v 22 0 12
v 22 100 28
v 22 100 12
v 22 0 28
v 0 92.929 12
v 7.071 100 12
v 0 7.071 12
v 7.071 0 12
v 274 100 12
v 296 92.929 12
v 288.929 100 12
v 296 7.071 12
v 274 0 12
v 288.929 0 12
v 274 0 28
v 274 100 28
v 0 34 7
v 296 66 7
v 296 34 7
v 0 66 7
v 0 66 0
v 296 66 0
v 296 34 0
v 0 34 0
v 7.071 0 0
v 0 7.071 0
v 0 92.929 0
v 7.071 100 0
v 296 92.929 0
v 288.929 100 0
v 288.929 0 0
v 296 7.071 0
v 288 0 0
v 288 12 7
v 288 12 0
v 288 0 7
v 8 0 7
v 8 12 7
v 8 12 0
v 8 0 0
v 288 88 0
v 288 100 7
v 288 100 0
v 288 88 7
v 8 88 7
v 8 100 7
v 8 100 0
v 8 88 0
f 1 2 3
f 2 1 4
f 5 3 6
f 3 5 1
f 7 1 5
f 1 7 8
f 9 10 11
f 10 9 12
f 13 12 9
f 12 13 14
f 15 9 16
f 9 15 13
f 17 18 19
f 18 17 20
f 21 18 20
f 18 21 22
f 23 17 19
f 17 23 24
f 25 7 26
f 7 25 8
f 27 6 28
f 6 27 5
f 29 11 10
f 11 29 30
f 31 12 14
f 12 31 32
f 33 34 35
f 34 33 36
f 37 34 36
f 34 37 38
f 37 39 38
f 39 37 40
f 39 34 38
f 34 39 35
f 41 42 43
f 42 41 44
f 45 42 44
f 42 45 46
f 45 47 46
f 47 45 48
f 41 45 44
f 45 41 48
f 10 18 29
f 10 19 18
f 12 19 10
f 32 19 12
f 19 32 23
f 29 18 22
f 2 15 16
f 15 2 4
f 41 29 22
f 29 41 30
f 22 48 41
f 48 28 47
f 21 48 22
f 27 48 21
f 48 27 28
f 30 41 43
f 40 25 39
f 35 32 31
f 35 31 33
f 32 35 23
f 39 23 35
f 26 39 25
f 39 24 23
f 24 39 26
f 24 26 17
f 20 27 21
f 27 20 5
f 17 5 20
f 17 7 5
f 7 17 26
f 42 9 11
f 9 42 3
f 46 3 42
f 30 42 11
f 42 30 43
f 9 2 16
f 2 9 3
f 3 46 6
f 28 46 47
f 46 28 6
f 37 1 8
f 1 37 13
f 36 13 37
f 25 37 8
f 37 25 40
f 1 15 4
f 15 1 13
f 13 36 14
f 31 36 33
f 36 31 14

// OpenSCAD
include <../src/wardrobe.scad>;
plank_yx_middle_top();
//github_openscad -o wardrobe_3/plank_yx_middle_top.stl -D wardrobe_n=3 -D cutting_edge=0 -D break_view_length=0 wardrobe_3/plank_yx_middle_top_stl.scad
